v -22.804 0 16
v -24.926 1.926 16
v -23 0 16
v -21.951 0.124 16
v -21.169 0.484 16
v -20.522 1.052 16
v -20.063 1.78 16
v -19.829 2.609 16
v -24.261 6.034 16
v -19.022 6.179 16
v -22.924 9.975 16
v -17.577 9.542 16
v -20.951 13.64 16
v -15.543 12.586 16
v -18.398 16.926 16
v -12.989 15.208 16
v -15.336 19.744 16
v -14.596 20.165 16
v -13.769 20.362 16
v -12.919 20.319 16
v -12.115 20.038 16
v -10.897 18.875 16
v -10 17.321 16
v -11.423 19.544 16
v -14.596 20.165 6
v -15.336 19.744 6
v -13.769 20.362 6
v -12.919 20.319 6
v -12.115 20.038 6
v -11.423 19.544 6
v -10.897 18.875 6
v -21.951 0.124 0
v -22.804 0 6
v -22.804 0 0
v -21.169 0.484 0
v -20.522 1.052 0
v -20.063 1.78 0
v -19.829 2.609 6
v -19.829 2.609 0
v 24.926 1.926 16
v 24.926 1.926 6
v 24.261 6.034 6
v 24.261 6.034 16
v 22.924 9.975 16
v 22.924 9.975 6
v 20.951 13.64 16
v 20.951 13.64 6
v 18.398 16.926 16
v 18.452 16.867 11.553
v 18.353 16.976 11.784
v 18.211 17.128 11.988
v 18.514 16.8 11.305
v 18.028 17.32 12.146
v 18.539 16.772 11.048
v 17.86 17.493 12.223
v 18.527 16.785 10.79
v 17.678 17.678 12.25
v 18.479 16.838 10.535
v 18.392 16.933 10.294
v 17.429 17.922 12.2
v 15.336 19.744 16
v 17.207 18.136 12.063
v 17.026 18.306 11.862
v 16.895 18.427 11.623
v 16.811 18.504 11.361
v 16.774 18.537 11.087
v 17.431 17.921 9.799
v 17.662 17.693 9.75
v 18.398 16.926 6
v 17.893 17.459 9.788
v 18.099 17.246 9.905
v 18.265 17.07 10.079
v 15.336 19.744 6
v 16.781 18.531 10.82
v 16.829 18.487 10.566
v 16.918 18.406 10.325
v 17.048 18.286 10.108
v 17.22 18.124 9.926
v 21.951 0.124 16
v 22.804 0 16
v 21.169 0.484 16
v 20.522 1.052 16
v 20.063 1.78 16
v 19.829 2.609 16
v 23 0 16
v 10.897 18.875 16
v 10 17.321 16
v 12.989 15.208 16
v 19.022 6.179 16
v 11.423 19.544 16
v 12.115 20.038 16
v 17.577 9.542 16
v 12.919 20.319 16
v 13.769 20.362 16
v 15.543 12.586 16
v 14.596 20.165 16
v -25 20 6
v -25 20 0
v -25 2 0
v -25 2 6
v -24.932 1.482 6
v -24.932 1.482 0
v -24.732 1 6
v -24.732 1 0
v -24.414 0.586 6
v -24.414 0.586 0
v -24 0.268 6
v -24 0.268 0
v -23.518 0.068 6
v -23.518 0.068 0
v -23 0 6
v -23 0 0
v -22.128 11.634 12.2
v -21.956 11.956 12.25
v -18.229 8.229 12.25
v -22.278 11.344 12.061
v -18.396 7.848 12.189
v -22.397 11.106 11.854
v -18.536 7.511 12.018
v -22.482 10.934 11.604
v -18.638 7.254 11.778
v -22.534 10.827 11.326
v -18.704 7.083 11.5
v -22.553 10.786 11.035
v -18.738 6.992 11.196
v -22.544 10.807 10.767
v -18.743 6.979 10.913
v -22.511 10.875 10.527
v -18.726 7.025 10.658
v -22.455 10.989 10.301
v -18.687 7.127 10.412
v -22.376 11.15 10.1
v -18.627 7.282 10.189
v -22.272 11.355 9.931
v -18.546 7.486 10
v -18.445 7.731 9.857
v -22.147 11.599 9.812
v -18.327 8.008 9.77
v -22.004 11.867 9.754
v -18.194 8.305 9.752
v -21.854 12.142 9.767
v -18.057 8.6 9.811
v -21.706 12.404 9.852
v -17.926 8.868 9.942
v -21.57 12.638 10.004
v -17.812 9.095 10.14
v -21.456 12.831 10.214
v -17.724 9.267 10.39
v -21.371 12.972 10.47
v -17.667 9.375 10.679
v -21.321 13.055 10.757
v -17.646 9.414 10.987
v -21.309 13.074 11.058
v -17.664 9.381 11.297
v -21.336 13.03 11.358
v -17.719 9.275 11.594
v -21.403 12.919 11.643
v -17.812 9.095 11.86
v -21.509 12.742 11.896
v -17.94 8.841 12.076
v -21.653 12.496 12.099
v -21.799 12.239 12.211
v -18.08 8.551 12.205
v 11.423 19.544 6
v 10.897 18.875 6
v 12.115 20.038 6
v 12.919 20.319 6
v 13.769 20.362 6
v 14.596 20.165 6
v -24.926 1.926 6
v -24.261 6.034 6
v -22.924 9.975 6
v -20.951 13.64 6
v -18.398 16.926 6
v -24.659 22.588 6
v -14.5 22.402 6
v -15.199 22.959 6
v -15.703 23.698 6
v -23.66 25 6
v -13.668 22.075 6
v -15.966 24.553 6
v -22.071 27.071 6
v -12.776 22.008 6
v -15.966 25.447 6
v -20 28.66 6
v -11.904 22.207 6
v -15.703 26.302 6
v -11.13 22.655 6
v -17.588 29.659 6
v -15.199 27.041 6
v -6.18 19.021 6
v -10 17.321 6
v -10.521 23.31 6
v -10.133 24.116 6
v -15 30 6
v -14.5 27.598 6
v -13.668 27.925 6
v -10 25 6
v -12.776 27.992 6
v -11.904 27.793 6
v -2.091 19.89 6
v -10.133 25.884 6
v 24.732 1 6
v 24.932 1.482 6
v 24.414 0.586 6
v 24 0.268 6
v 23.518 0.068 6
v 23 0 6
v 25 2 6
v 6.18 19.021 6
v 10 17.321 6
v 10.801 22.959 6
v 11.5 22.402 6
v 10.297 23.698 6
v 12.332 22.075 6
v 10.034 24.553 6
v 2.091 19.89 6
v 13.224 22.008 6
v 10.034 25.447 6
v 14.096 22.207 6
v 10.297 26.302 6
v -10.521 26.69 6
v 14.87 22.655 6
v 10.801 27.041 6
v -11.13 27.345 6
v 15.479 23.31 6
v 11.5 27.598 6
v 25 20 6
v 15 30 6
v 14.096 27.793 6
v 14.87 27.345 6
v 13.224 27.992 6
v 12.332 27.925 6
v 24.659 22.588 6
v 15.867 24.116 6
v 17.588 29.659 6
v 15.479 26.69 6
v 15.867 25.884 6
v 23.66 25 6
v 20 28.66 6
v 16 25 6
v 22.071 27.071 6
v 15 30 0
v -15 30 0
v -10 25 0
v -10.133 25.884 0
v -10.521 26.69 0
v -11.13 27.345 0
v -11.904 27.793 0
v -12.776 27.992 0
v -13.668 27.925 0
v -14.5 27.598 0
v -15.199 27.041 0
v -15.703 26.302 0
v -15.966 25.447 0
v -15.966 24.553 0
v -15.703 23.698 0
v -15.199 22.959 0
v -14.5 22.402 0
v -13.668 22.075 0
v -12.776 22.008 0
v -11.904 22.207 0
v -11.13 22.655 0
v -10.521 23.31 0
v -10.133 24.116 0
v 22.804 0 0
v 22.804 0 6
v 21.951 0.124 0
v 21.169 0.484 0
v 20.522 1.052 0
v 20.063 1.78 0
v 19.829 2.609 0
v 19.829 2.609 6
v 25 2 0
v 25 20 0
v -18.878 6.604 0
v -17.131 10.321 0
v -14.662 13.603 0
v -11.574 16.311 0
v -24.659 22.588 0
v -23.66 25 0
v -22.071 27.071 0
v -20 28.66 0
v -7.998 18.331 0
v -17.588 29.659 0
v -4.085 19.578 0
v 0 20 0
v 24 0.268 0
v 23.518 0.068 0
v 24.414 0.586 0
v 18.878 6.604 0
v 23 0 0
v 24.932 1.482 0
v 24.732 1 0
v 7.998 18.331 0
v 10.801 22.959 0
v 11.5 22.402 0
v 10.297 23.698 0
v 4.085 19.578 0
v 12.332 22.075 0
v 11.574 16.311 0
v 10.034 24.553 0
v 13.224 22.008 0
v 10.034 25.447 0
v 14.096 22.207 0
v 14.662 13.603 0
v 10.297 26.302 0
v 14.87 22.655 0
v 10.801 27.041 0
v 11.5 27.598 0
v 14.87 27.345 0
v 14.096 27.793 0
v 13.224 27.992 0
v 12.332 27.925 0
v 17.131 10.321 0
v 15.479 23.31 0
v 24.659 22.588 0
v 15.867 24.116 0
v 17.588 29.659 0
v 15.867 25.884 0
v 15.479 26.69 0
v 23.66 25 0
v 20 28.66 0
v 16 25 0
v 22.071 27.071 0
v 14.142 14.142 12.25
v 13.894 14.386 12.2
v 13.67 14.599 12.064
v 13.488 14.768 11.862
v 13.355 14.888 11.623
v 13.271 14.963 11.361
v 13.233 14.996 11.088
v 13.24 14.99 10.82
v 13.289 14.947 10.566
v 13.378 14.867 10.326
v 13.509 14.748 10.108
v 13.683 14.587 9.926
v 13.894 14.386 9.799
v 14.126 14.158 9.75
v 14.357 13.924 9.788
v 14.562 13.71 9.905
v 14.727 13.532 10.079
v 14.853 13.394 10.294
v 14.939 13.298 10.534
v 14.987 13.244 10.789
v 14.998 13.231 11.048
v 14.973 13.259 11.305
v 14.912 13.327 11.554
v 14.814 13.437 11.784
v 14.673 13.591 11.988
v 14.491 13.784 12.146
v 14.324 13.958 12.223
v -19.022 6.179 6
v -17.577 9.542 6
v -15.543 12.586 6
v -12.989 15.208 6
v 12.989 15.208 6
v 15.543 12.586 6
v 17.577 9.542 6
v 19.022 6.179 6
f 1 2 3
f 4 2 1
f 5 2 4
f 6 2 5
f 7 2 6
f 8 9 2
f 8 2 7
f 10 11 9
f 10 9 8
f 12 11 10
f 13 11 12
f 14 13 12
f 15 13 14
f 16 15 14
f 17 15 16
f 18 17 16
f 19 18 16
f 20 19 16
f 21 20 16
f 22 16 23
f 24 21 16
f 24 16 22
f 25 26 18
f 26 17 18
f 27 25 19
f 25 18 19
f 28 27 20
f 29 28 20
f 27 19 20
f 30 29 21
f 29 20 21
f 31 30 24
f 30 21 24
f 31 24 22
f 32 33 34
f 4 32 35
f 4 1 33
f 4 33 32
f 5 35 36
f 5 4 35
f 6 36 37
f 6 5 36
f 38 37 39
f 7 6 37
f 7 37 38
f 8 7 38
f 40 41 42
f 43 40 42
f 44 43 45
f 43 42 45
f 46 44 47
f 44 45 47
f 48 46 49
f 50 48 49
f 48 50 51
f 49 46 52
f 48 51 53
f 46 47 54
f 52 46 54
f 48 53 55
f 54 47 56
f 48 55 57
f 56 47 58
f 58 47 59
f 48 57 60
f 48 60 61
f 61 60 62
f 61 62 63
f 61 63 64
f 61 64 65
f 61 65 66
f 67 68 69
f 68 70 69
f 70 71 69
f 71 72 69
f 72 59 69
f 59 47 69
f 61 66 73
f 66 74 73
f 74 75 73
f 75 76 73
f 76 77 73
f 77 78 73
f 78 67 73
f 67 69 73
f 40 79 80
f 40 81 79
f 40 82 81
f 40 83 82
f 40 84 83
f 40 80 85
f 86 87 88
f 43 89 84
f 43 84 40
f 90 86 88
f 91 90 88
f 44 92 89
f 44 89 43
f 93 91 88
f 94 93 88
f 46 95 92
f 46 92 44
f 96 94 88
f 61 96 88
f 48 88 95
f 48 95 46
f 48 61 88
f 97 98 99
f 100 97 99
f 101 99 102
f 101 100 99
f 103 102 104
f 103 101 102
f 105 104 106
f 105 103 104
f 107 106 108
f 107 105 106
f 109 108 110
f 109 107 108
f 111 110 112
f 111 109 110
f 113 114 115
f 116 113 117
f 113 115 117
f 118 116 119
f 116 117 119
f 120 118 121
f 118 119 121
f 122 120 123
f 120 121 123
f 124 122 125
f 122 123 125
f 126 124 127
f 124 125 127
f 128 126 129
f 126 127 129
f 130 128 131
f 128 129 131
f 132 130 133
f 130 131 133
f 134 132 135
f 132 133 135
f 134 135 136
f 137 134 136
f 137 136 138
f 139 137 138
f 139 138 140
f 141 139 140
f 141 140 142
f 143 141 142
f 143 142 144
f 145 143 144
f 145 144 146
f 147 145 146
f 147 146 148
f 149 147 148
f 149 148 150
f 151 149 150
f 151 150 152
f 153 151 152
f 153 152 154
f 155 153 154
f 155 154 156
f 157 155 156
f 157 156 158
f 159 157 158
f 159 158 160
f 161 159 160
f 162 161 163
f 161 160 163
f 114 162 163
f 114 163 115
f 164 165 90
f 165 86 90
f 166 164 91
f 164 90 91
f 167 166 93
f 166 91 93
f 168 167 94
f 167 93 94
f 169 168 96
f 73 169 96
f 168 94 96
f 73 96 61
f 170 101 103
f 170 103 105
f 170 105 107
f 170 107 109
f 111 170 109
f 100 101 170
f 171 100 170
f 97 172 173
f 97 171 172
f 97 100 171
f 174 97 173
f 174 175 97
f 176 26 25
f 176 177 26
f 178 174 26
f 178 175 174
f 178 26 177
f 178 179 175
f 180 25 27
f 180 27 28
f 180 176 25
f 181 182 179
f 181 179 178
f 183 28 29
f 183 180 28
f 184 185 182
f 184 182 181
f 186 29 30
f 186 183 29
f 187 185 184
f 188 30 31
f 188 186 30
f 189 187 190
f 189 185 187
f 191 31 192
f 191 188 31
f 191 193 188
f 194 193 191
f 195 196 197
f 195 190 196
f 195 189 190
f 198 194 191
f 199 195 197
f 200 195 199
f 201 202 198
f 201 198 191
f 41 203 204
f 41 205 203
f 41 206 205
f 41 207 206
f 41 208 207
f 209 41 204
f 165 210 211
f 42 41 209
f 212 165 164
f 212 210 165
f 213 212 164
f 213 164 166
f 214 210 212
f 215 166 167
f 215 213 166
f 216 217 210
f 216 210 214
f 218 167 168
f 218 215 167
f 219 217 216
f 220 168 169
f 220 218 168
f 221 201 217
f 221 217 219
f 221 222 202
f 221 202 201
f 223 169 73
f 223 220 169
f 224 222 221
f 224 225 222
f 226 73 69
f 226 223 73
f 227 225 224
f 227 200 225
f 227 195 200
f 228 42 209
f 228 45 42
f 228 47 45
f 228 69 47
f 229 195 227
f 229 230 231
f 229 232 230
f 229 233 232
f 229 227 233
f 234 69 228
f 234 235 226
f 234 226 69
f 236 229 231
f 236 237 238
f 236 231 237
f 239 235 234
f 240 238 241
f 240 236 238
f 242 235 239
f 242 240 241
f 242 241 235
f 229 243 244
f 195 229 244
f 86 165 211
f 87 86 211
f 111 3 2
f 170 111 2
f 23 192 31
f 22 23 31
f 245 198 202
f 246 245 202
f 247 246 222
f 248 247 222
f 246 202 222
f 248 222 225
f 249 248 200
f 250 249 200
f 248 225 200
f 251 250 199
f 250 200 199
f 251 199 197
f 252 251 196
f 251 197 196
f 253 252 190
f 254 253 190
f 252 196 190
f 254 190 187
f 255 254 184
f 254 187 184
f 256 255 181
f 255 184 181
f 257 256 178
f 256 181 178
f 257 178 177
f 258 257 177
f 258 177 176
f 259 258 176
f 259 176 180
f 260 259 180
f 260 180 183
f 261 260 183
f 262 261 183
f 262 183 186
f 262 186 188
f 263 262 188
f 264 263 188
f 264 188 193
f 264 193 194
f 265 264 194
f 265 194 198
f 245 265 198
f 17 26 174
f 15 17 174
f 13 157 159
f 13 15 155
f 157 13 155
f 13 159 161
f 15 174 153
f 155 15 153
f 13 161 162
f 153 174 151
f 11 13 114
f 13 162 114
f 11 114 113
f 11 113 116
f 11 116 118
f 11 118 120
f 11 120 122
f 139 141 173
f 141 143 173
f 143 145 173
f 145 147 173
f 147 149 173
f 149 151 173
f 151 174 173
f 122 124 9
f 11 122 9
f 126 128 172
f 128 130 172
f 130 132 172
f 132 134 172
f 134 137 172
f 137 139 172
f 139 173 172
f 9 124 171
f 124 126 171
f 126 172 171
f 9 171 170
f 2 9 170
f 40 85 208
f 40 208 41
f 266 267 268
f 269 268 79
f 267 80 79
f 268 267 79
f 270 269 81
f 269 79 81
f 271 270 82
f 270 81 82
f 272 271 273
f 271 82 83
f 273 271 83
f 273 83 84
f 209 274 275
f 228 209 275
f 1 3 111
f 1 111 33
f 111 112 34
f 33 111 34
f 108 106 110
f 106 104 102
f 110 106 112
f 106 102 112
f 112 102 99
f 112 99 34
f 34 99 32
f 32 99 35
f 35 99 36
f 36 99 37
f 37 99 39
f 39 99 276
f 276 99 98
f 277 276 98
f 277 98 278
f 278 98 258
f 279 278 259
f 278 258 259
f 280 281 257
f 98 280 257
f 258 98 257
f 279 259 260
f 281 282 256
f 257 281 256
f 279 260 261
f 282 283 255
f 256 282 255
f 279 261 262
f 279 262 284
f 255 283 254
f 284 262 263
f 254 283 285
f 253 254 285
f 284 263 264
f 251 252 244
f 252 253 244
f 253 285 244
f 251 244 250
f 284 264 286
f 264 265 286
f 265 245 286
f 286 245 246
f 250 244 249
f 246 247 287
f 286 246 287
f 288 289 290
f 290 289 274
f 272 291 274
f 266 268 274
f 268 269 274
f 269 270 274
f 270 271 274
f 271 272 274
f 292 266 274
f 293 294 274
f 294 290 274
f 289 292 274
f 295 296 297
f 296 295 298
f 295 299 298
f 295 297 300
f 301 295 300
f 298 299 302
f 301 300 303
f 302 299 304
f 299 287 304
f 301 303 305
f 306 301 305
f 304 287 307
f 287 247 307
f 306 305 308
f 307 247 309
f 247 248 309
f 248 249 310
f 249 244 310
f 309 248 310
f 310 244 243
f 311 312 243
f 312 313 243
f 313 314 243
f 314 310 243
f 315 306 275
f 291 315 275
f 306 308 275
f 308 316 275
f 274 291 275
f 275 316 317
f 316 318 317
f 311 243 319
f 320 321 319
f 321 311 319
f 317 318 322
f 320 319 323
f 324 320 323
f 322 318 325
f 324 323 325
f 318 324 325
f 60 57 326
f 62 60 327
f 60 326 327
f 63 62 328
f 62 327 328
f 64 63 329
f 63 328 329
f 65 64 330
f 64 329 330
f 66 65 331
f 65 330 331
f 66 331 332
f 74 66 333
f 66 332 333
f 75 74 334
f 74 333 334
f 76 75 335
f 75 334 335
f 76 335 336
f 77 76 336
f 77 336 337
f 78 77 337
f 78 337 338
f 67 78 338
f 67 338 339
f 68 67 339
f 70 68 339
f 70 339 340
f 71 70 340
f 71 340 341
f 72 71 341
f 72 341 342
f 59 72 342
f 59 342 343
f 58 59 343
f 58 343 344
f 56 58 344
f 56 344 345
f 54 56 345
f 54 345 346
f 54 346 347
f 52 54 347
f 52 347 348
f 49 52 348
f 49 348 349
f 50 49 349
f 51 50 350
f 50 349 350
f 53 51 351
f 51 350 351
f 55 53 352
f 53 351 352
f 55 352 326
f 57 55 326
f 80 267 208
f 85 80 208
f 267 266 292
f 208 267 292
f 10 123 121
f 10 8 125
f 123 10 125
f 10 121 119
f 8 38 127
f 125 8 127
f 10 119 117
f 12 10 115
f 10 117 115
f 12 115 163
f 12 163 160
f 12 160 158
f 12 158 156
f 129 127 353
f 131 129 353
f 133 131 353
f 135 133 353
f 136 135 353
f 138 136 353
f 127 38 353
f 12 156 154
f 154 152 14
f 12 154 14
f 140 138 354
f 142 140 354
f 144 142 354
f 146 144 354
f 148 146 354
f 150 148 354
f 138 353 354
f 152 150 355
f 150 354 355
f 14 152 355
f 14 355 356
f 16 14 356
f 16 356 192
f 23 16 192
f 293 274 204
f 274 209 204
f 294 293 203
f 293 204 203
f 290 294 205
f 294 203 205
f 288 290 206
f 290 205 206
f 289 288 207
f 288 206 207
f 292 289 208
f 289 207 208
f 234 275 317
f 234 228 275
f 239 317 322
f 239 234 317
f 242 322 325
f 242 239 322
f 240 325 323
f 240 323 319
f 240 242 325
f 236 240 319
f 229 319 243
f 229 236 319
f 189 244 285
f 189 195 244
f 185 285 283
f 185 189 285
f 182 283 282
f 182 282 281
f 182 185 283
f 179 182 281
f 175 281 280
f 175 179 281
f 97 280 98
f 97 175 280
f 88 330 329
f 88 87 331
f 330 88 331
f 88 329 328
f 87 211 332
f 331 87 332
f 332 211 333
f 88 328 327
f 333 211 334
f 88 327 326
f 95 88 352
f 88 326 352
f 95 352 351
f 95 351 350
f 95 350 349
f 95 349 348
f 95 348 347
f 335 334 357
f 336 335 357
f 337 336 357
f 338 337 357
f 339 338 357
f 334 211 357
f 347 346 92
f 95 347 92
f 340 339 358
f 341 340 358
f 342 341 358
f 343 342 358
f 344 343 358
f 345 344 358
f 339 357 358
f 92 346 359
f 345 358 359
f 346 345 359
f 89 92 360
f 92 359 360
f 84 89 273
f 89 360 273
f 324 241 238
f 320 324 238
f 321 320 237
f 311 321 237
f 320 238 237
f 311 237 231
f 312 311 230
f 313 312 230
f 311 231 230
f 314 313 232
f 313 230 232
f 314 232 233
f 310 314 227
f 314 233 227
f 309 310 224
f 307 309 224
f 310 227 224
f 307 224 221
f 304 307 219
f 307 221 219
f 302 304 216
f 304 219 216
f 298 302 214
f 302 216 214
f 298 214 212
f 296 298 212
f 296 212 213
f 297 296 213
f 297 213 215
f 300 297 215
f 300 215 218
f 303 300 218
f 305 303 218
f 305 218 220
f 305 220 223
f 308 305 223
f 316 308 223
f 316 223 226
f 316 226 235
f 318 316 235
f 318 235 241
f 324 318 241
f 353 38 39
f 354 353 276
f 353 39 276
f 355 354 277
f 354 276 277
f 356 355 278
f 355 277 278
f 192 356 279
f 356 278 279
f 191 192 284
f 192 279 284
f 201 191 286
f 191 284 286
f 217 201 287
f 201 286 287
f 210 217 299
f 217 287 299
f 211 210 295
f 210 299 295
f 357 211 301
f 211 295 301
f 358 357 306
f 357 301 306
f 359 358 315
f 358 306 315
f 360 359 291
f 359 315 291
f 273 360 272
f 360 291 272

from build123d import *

# Parameters (mm, degrees)
BOSS_EXTRUDE1_DEPTH     = 6
BOSS_EXTRUDE2_DEPTH     = 10
BOSS_EXTRUDE3_DEPTH     = 6
SKETCH4_R               = 3
CUT_EXTRUDE1_DEPTH      = 41.311288741
TAP_DRILL_FOR_M3_TAP1_D = 2.5
TAP_DRILL_FOR_M3_TAP2_D = 2.5
CHAMFER1_SIZE           = 2
FILLET1_R               = 3
FILLET2_R               = 10
FILLET3_R               = 2


with BuildPart() as part:
    # Sketch1 → Boss-Extrude1 (new body)
    with BuildSketch(Plane.XY):
        with BuildLine():
            Line((20, 0), (25, 0))
            ThreePointArc((25, 0), (0, 25), (-25, 0))
            Line((-25, 0), (-20, 0))
            ThreePointArc((-20, 0), (0, 20), (20, 0))
        make_face()
    extrude(amount=BOSS_EXTRUDE1_DEPTH)

    # Sketch2 → Boss-Extrude2 (add)
    with BuildSketch(Plane.XY.offset(6)):
        with BuildLine():
            ThreePointArc((-20, 0), (-17.320508076, 10), (-10, 17.320508076))
            Line((-10, 17.320508076), (-12.5, 21.650635095))
            ThreePointArc((-12.5, 21.650635095), (-21.650635095, 12.5), (-25, 0))
            Line((-25, 0), (-20, 0))
        make_face()
        with BuildLine():
            Line((12.5, 21.650635095), (10, 17.320508076))
            ThreePointArc((10, 17.320508076), (17.320508076, 10), (20, 0))
            Line((20, 0), (25, 0))
            ThreePointArc((25, 0), (21.650635095, 12.5), (12.5, 21.650635095))
        make_face()
    extrude(amount=BOSS_EXTRUDE2_DEPTH)

    # Sketch3 → Boss-Extrude3 (add)
    with BuildSketch(Plane(origin=(0, 0, 0), x_dir=(-1, 0, 0), z_dir=(0, 0, -1))):
        with BuildLine():
            Line((-25, 0), (-25, 30))
            Line((-25, 30), (25, 30))
            Line((25, 30), (25, 0))
            ThreePointArc((25, 0), (0, 25), (-25, 0))
        make_face()
    extrude(amount=-BOSS_EXTRUDE3_DEPTH)

    # Sketch4 → Cut-Extrude1 (cut, through all)
    with BuildSketch(Plane.XY.offset(6)):
        with Locations((13, 25)):
            Circle(SKETCH4_R)
        with Locations((-13, 25)):
            Circle(SKETCH4_R)
    extrude(amount=-CUT_EXTRUDE1_DEPTH, mode=Mode.SUBTRACT)

    # Tap Drill for M3 Tap1 (through all)
    with Locations(Plane(origin=(-17.67766953, 17.67766953, 0), x_dir=(0, 0, -1), z_dir=(-0.7071067811865488, 0.7071067811865464, 0))):
        with Locations((-11, 7.071067812)):
            Hole(TAP_DRILL_FOR_M3_TAP1_D / 2)

    # Tap Drill for M3 Tap2 (through all)
    with Locations(Plane(origin=(17.67766953, 17.67766953, 0), x_dir=(0, 0, -1), z_dir=(0.7071067811865488, 0.7071067811865464, 0))):
        with Locations((-11, 0)):
            Hole(TAP_DRILL_FOR_M3_TAP2_D / 2)

    # Chamfer1
    # the kernel refuses this chamfer: 2 mm, written as the material it takes off along each edge
    with BuildSketch(Plane(origin=(-25, 0, 21.143365976), x_dir=(1, 0, 0), z_dir=(0, 0, -1))) as chamfer1_piece_1:
        with BuildLine():
            Line((CHAMFER1_SIZE, 0), (0.074278418, -1.925721582))
            ThreePointArc((0.074278418, -1.925721582), (0.019638133, -0.990717402), (0, 0))
            Line((0, 0), (CHAMFER1_SIZE, 0))
        make_face()
    extrude(amount=15.143365976, mode=Mode.SUBTRACT)
    with BuildSketch(Plane(origin=(25, 0, 21.143365976), x_dir=(-1, 0, 0), z_dir=(0, 0, -1))) as chamfer1_piece_2:
        with BuildLine():
            Line((CHAMFER1_SIZE, 0), (0.074278418, 1.925721582))
            ThreePointArc((0.074278418, 1.925721582), (0.019638133, 0.990717402), (0, 0))
            Line((0, 0), (CHAMFER1_SIZE, 0))
        make_face()
    extrude(amount=15.143365976, mode=Mode.SUBTRACT)

    # Fillet1
    fillet1_edges = [part.edges().sort_by_distance(p)[0] for p in [
        (-12.5, 21.650635095, 11),
        (12.5, 21.650635095, 11),
        (20, 0, 8),
        (-20, 0, 8),
    ]]
    fillet(fillet1_edges, radius=FILLET1_R)

    # Fillet2
    fillet2_edges = [part.edges().sort_by_distance(p)[0] for p in [
        (-25, 30, 3),
        (25, 30, 3),
    ]]
    fillet(fillet2_edges, radius=FILLET2_R)

    # Fillet3
    fillet3_edges = [part.edges().sort_by_distance(p)[0] for p in [
        (25, 0, 3),
        (-25, 0, 3),
    ]]
    fillet(fillet3_edges, radius=FILLET3_R)


solid = part.part
